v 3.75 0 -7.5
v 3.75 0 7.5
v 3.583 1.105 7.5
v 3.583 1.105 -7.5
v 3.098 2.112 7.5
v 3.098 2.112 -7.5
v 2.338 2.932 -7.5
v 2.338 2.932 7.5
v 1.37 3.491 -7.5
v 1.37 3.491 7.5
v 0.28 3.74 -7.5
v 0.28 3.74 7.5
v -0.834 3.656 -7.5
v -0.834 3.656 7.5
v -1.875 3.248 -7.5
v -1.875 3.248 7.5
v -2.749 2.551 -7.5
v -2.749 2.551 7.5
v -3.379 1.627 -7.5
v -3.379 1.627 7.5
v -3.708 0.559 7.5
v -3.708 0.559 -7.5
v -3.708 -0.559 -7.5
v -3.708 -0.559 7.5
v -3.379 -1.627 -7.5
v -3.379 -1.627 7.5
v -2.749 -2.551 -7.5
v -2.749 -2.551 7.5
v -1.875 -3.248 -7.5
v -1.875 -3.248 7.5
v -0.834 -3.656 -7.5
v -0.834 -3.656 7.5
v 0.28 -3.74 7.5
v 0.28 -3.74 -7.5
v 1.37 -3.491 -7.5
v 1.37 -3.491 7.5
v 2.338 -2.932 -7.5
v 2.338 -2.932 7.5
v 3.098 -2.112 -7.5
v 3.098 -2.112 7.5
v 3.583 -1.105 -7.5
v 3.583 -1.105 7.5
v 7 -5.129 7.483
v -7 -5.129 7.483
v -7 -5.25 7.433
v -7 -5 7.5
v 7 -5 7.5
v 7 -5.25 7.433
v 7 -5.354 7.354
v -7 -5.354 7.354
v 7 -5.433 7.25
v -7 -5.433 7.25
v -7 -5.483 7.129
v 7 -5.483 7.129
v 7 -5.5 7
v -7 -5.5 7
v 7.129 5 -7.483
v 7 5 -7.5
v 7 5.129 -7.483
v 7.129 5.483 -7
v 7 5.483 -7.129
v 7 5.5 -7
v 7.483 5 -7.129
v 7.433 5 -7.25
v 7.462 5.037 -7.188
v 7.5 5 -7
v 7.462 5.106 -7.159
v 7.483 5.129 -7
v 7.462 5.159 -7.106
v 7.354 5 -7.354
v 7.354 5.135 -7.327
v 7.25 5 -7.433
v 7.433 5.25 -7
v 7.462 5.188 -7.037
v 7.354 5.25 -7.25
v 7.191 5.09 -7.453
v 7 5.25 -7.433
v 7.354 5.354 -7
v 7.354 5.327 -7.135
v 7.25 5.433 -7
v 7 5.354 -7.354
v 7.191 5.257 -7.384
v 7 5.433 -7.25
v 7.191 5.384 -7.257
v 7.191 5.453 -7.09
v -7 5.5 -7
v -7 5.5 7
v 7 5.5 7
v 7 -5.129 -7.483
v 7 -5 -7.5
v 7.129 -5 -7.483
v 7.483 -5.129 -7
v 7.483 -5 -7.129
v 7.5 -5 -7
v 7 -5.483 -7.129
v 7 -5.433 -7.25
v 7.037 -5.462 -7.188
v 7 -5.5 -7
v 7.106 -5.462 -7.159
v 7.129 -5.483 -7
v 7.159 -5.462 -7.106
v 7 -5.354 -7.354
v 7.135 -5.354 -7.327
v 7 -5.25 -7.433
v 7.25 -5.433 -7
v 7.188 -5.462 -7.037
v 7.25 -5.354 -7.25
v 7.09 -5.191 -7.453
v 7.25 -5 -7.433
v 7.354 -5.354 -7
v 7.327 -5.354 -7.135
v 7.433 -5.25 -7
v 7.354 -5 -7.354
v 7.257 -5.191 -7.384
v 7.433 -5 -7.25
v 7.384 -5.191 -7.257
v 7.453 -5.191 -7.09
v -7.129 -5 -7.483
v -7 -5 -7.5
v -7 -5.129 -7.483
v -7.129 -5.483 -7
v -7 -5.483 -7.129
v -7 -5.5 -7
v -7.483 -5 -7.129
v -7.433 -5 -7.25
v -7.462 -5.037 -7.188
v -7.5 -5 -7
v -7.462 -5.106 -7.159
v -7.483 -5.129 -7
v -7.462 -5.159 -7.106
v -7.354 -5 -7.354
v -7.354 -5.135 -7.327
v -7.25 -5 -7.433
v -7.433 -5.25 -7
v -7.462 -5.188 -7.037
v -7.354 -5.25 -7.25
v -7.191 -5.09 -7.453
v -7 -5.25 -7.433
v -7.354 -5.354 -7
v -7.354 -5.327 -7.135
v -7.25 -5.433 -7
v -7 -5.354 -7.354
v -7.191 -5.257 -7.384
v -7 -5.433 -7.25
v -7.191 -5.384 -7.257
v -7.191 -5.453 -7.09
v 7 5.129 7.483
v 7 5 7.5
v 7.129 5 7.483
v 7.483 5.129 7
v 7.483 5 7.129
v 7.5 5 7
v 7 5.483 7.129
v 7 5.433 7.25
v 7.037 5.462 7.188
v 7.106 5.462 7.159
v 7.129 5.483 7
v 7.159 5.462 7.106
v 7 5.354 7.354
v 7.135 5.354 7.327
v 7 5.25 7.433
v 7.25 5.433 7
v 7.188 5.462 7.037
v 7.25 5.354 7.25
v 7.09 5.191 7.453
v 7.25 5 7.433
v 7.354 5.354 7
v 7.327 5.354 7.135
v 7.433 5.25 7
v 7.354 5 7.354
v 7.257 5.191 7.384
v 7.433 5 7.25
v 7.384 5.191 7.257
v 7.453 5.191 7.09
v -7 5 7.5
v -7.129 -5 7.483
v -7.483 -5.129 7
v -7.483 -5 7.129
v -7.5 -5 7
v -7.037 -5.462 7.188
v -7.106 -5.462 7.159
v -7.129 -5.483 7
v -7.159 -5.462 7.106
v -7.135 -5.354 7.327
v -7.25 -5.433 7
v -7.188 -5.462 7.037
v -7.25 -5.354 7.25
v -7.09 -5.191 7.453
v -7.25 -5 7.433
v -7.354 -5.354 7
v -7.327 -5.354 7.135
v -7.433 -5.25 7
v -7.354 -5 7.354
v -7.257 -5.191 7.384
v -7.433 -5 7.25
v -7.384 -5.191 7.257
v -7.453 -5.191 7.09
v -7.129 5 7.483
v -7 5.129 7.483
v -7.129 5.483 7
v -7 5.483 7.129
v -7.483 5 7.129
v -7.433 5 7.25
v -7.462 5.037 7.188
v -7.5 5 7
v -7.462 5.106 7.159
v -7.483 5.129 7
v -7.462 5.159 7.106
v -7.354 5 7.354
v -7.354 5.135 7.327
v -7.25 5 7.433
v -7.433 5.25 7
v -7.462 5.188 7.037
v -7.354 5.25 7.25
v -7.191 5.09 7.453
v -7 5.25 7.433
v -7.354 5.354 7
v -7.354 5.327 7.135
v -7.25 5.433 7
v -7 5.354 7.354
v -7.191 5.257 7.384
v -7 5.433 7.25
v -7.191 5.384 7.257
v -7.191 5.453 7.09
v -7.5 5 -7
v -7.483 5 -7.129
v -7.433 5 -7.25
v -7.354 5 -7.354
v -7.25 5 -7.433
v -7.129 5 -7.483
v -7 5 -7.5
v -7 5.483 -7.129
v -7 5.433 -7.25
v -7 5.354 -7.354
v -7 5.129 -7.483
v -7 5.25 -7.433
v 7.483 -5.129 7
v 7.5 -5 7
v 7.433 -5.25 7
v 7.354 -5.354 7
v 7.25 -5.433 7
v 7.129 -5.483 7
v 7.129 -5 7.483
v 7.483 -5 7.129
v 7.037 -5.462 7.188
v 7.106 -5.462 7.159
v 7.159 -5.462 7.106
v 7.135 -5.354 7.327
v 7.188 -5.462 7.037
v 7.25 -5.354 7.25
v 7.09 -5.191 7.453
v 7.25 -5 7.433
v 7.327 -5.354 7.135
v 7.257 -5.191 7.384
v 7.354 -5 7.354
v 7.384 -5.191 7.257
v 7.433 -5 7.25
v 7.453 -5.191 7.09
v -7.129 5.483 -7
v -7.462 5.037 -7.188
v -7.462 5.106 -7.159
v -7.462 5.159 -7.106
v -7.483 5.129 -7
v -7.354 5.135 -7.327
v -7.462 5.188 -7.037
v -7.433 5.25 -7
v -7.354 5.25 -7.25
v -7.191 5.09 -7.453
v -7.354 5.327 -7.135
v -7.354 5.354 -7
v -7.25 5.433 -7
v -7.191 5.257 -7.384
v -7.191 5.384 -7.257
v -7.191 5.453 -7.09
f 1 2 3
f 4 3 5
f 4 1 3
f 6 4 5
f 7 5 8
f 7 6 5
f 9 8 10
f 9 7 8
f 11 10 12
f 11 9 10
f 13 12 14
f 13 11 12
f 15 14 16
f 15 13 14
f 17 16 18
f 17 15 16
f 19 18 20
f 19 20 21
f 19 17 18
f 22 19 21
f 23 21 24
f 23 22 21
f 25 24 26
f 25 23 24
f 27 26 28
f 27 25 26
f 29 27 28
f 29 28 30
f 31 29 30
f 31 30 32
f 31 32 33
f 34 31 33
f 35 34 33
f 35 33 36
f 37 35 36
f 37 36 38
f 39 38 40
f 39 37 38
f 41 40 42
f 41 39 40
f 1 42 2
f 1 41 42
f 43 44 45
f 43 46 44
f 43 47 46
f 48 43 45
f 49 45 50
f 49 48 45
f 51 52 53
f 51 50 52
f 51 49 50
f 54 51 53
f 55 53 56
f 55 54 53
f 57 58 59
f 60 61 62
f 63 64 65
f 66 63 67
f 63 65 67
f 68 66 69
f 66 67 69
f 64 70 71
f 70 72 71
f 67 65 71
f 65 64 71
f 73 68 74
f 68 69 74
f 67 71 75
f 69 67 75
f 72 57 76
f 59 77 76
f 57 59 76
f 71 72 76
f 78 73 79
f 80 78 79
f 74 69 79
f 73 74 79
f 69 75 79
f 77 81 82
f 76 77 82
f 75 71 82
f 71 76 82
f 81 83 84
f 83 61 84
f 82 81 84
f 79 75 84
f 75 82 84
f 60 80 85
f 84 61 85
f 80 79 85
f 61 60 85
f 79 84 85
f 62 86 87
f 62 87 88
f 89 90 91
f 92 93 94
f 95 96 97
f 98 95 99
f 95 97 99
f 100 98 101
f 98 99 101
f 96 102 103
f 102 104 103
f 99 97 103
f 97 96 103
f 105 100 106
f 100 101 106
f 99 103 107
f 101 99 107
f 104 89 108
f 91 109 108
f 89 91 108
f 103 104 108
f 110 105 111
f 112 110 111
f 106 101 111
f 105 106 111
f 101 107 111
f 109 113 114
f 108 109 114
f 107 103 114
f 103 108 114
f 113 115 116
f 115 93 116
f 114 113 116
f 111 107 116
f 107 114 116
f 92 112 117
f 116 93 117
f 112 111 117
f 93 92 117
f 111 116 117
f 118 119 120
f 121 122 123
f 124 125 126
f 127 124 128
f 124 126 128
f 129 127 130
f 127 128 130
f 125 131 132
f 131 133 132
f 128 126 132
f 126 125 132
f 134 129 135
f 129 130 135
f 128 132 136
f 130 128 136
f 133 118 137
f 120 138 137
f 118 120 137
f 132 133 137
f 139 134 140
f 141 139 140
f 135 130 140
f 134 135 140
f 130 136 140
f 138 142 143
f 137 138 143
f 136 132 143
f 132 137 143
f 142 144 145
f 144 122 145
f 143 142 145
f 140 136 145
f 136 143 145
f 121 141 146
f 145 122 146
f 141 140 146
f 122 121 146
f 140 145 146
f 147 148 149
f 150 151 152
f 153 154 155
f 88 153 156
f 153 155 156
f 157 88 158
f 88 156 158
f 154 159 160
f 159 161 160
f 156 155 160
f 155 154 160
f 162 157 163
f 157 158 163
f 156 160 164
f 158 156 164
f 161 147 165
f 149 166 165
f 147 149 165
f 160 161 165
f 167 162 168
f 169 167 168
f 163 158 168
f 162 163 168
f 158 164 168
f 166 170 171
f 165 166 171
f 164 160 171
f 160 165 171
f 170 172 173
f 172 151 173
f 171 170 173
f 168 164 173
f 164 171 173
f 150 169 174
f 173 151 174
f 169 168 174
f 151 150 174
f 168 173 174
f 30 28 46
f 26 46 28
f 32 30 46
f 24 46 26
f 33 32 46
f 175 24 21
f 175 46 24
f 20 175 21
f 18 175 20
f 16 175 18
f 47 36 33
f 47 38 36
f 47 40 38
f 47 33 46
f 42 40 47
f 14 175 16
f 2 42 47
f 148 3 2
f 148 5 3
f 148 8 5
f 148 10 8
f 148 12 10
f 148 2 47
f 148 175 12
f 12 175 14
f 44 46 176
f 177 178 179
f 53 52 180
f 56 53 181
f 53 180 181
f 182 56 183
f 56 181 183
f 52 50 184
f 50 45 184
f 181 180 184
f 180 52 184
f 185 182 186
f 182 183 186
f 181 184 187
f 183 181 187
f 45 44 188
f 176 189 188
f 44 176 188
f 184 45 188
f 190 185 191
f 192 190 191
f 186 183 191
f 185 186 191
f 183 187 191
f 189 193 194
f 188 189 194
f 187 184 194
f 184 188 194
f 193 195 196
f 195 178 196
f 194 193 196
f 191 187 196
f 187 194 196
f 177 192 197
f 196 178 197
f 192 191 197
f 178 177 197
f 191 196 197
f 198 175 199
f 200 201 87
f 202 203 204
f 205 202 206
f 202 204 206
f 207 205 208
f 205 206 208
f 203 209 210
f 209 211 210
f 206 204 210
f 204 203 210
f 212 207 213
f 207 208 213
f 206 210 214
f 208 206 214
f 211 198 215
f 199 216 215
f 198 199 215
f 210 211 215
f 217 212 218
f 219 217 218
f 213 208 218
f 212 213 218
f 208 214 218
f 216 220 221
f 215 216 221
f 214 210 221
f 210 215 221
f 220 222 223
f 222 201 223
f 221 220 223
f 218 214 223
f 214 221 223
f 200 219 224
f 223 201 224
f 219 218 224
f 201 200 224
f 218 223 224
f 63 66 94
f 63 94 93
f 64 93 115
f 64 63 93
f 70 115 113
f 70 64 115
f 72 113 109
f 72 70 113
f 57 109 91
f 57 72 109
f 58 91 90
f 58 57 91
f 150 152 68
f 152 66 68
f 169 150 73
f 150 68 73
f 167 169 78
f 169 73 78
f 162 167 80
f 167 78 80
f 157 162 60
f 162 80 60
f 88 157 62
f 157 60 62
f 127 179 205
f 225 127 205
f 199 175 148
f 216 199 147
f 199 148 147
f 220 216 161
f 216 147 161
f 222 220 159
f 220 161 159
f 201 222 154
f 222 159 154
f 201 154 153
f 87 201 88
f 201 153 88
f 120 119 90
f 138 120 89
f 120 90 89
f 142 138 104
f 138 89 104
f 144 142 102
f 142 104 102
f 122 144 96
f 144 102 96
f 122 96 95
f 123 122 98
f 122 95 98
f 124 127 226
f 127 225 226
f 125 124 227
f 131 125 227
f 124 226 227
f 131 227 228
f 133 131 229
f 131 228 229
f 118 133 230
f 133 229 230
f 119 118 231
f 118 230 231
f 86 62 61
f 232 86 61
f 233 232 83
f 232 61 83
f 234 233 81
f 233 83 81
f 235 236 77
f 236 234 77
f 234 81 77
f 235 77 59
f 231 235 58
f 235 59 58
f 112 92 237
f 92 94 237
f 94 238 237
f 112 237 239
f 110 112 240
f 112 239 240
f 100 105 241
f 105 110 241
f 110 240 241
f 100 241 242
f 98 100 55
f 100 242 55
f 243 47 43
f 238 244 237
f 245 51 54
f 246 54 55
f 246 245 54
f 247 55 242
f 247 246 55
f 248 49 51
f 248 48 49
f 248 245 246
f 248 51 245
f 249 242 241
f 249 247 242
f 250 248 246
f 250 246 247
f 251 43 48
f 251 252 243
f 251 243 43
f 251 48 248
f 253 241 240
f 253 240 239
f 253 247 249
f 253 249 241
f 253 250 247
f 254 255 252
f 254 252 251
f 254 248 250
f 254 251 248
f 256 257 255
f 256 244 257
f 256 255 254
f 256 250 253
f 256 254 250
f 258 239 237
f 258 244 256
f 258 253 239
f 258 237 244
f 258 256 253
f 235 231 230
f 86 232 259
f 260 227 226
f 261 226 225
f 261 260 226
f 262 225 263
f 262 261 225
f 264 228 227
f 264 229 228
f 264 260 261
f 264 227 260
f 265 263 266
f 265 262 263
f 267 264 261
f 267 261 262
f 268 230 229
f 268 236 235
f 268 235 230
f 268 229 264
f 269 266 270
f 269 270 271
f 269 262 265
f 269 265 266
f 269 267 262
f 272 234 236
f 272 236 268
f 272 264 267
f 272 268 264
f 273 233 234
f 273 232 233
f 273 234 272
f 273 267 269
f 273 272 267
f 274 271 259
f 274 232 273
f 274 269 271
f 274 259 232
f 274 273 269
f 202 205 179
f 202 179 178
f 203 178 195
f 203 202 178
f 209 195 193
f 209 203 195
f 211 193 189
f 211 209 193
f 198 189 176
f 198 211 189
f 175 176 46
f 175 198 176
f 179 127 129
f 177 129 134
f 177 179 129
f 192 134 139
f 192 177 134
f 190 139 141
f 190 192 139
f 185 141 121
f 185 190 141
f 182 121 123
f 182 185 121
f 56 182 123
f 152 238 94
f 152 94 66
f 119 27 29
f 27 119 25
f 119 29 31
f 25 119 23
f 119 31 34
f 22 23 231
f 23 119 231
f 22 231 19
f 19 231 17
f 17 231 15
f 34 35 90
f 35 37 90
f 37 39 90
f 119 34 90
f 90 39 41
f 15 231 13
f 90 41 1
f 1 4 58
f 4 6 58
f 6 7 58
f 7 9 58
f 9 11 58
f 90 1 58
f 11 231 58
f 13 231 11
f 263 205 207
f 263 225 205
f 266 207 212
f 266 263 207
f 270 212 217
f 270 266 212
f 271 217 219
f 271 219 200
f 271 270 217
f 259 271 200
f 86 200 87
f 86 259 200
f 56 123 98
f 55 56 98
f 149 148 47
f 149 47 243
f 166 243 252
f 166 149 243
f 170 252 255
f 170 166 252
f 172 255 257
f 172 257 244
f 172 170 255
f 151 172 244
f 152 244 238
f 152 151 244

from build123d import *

# Parameters (mm, degrees)
SKETCH1_W           = 15
SKETCH1_H           = 11
SKETCH1_R           = 3.75
BOSS_EXTRUDE1_DEPTH = 7.5
FILLET1_R           = 0.5


with BuildPart() as part:
    # Sketch1 → Boss-Extrude1 (new, symmetric)
    with BuildSketch(Plane.XY):
        Rectangle(SKETCH1_W, SKETCH1_H)
        Circle(SKETCH1_R, mode=Mode.SUBTRACT)
    extrude(amount=BOSS_EXTRUDE1_DEPTH, both=True)

    # Fillet1
    fillet1_edges = [part.edges().sort_by_distance(p)[0] for p in [
        (7.5, 0, 7.5),
        (0, 5.5, 7.5),
        (-7.5, 0, 7.5),
        (0, 5.5, -7.5),
        (7.5, 0, -7.5),
        (0, -5.5, -7.5),
        (-7.5, 0, -7.5),
        (0, -5.5, 7.5),
        (-7.5, 5.5, 0),
        (7.5, 5.5, 0),
        (7.5, -5.5, 0),
        (-7.5, -5.5, 0),
    ]]
    fillet(fillet1_edges, radius=FILLET1_R)


solid = part.part
